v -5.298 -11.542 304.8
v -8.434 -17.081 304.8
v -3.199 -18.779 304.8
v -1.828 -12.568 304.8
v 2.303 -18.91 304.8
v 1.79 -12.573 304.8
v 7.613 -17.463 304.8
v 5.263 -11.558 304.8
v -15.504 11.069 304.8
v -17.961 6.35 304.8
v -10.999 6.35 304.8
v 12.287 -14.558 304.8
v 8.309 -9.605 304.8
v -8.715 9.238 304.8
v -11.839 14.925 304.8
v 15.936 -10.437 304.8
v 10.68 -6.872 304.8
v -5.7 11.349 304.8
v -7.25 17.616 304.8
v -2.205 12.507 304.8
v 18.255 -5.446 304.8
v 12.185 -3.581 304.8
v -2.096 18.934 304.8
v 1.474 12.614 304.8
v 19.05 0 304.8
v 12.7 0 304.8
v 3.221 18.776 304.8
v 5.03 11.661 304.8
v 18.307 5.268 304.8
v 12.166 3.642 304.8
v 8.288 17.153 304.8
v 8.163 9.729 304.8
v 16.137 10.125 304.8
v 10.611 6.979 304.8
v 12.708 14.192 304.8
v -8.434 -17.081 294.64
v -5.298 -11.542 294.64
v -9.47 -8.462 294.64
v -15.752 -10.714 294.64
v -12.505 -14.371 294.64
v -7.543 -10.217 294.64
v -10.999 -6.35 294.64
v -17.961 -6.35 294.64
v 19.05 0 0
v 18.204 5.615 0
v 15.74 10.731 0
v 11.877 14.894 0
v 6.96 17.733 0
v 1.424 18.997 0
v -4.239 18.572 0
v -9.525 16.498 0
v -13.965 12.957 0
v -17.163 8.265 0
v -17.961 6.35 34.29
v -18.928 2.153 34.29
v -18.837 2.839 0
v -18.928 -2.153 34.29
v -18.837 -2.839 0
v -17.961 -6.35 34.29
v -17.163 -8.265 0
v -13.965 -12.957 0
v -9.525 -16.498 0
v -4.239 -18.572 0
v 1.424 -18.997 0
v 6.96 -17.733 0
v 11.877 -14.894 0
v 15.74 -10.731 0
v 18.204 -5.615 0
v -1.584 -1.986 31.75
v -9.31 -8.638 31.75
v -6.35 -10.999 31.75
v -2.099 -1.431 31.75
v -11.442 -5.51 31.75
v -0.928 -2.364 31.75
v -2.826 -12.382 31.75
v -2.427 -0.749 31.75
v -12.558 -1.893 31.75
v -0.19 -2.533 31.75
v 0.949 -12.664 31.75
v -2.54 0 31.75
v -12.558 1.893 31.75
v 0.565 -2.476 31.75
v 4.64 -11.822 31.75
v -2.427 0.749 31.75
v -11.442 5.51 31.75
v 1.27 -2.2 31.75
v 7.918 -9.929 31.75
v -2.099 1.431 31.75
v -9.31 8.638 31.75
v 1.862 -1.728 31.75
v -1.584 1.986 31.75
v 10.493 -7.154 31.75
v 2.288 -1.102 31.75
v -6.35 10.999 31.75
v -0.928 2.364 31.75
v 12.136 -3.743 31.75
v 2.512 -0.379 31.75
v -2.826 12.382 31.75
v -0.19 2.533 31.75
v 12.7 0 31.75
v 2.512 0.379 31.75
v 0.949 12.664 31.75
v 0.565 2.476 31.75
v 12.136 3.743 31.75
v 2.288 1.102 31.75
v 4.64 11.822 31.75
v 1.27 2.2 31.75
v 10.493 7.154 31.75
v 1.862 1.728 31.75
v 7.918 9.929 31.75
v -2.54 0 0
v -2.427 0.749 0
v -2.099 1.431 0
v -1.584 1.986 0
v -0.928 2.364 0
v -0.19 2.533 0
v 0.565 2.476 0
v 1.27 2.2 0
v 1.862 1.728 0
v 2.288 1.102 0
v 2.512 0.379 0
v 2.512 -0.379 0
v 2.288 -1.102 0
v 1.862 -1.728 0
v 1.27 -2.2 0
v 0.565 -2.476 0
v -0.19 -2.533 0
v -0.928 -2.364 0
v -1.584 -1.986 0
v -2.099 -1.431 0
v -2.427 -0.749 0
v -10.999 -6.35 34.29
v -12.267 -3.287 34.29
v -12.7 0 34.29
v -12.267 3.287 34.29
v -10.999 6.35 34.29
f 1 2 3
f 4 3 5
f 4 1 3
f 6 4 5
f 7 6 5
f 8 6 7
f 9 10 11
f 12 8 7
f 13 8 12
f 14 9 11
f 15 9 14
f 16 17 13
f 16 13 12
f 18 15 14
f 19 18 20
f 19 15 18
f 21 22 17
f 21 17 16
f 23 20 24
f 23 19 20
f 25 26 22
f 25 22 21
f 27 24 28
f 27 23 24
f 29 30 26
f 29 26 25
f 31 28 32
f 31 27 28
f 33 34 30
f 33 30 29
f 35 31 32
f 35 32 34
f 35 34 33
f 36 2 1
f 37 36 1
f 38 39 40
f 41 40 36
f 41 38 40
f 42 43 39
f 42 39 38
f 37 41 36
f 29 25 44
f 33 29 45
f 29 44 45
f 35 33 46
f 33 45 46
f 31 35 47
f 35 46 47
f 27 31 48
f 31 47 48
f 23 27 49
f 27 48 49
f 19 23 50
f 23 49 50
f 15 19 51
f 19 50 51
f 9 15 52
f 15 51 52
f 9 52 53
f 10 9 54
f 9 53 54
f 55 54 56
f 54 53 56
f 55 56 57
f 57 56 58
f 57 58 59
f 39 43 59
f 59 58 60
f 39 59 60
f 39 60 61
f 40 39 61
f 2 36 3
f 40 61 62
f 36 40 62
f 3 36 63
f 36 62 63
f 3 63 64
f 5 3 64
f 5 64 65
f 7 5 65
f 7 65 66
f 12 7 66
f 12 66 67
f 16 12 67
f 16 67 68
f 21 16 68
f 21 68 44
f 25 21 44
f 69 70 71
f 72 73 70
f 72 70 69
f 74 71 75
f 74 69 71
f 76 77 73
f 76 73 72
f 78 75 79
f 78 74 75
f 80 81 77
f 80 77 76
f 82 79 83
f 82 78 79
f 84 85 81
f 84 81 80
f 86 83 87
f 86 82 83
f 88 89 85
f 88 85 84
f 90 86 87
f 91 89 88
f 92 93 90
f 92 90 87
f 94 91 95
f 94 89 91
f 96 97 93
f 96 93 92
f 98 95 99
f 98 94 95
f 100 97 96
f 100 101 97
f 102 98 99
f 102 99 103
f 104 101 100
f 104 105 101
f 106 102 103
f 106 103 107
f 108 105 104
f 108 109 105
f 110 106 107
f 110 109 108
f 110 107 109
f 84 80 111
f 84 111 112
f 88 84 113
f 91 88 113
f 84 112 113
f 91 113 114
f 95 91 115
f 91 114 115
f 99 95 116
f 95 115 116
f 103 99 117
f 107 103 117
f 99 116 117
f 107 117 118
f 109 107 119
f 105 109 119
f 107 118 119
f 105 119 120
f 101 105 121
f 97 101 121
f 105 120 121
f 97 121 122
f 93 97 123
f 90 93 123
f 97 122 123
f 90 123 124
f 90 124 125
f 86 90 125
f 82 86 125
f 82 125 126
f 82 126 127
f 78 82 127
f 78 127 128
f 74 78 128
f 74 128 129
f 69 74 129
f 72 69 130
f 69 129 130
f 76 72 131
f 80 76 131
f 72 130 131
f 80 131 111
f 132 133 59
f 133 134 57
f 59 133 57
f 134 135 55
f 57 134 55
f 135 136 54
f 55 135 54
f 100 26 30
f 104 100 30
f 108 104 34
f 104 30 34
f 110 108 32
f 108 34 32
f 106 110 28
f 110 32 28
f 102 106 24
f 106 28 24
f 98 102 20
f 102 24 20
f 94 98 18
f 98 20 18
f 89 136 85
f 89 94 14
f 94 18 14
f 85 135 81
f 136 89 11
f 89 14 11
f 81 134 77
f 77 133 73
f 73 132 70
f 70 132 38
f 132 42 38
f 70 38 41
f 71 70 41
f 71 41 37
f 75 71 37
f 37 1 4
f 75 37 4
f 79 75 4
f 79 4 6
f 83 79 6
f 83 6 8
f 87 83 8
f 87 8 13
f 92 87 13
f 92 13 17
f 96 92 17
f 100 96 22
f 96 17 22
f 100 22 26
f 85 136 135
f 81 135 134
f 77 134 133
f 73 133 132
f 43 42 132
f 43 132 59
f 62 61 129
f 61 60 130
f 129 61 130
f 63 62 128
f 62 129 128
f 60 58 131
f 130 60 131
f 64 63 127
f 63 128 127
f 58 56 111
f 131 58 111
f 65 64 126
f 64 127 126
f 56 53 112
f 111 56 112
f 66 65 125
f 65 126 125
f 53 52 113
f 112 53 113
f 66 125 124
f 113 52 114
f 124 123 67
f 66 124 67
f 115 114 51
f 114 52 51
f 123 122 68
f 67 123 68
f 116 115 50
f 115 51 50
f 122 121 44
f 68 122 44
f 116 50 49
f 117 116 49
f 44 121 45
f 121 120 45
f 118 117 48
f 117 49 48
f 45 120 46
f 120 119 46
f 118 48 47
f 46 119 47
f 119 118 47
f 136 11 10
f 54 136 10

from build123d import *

# Parameters (mm, degrees)
SKETCH1_R           = 19.05
BOSS_EXTRUDE1_DEPTH = 304.8
SKETCH3_R           = 12.7
CUT_EXTRUDE1_DEPTH  = 273.05
SKETCH4_R           = 2.54
CUT_EXTRUDE2_DEPTH  = 31.75
CUT_EXTRUDE3_DEPTH  = 273.05
CUT_EXTRUDE4_DEPTH  = 12.7


with BuildPart() as part:
    # Sketch1 → Boss-Extrude1 (new body)
    with BuildSketch(Plane.XY):
        Circle(SKETCH1_R)
    extrude(amount=BOSS_EXTRUDE1_DEPTH)

    # Sketch3 → Cut-Extrude1 (cut)
    with BuildSketch(Plane.XY.offset(304.8)):
        Circle(SKETCH3_R)
    extrude(amount=-CUT_EXTRUDE1_DEPTH, mode=Mode.SUBTRACT)

    # Sketch4 → Cut-Extrude2 (cut)
    with BuildSketch(Plane(origin=(0, 0, 0), x_dir=(-1, 0, 0), z_dir=(0, 0, -1))):
        Circle(SKETCH4_R)
    extrude(amount=-CUT_EXTRUDE2_DEPTH, mode=Mode.SUBTRACT)

    # Sketch5 → Cut-Extrude3 (cut)
    with BuildSketch(Plane.XY.offset(307.34)):
        Polygon((-12.7, 6.35), (-8.710116392, 6.35), (-8.710116392, -6.35), (-20.268037983, -6.35), (-20.268037983, 6.35), align=None)
    extrude(amount=-CUT_EXTRUDE3_DEPTH, mode=Mode.SUBTRACT)

    # Sketch7 → Cut-Extrude4 (cut)
    with BuildSketch(Plane.XY.offset(307.34)):
        Polygon((-17.960512242, -6.35), (-18.177595791, -12.696288264), (-18.177595791, -17.489691447), (-8.665474889, -17.489691447), (-4.23331347, -9.662232457), (-8.307734332, -6.35), align=None)
    extrude(amount=-CUT_EXTRUDE4_DEPTH, mode=Mode.SUBTRACT)


solid = part.part
